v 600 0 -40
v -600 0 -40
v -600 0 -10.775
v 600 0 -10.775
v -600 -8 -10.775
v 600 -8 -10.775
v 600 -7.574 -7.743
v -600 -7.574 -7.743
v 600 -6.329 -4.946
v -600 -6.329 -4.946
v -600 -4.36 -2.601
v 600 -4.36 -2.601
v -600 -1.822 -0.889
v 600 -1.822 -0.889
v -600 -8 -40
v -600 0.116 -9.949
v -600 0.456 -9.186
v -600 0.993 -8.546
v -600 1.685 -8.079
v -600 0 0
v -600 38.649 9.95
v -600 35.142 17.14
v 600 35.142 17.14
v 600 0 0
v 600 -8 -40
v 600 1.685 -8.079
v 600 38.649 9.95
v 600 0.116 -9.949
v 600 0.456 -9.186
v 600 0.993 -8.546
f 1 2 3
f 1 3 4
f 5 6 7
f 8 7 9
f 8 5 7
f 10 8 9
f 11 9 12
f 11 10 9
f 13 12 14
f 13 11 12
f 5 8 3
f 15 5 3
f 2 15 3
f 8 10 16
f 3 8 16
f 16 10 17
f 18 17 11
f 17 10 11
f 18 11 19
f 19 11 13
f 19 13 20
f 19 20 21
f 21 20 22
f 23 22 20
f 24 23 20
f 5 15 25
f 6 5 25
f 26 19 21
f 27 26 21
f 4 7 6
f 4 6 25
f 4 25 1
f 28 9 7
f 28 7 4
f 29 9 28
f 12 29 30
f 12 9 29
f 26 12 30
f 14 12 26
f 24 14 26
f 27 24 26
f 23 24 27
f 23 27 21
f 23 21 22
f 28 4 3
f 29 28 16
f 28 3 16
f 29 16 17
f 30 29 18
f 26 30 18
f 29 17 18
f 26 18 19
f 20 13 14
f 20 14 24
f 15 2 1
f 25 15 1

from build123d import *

# Parameters (mm, degrees)
SKETCH2_W            = 1200
SKETCH2_H            = 40
BASE_FLANGE1_DEPTH   = 8
EDGE_FLANGE1_START   = -600
EDGE_FLANGE1_DEPTH   = 1200
EDGE_FLANGE1_2_DEPTH = 1200


# Read off the part's stored shape, not the designer's step: Edge-Flange1
# Sheet-metal steps are written as plain solids
with BuildPart() as part:
    # Sketch2 → Base-Flange1 (new body)
    with BuildSketch(Plane(origin=(0, 0, 0), x_dir=(1, 0, 0), z_dir=(0, 1, 0))):
        with Locations((0, 20)):
            Rectangle(SKETCH2_W, SKETCH2_H)
    extrude(amount=-BASE_FLANGE1_DEPTH)

    # Edge-Flange1 outline → Edge-Flange1 (cut)
    with BuildSketch(Plane.YZ.offset(EDGE_FLANGE1_START)):
        with BuildLine():
            ThreePointArc((-8, -10.77542358), (-6.328529058, -4.946311673), (-1.822082615, -0.88868907))
            Line((-1.822082615, -0.88868907), (0, 0))
            Line((0, 0), (-8, 0))
            Line((-8, 0), (-8, -10.77542358))
        make_face()
    extrude(amount=EDGE_FLANGE1_DEPTH, mode=Mode.SUBTRACT)

    # Edge-Flange1 2 outline → Edge-Flange1 2 (add)
    with BuildSketch(Plane.YZ.offset(EDGE_FLANGE1_START)):
        with BuildLine():
            Line((35.142114222, 17.139954337), (0, 0))
            Line((0, 0), (0, -10.77542358))
            ThreePointArc((0, -10.77542358), (0.455855712, -9.185665787), (1.68488656, -8.079041441))
            Line((1.68488656, -8.079041441), (38.649083397, 9.949601967))
            Line((38.649083397, 9.949601967), (35.142114222, 17.139954337))
        make_face()
    extrude(amount=EDGE_FLANGE1_2_DEPTH)


solid = part.part
